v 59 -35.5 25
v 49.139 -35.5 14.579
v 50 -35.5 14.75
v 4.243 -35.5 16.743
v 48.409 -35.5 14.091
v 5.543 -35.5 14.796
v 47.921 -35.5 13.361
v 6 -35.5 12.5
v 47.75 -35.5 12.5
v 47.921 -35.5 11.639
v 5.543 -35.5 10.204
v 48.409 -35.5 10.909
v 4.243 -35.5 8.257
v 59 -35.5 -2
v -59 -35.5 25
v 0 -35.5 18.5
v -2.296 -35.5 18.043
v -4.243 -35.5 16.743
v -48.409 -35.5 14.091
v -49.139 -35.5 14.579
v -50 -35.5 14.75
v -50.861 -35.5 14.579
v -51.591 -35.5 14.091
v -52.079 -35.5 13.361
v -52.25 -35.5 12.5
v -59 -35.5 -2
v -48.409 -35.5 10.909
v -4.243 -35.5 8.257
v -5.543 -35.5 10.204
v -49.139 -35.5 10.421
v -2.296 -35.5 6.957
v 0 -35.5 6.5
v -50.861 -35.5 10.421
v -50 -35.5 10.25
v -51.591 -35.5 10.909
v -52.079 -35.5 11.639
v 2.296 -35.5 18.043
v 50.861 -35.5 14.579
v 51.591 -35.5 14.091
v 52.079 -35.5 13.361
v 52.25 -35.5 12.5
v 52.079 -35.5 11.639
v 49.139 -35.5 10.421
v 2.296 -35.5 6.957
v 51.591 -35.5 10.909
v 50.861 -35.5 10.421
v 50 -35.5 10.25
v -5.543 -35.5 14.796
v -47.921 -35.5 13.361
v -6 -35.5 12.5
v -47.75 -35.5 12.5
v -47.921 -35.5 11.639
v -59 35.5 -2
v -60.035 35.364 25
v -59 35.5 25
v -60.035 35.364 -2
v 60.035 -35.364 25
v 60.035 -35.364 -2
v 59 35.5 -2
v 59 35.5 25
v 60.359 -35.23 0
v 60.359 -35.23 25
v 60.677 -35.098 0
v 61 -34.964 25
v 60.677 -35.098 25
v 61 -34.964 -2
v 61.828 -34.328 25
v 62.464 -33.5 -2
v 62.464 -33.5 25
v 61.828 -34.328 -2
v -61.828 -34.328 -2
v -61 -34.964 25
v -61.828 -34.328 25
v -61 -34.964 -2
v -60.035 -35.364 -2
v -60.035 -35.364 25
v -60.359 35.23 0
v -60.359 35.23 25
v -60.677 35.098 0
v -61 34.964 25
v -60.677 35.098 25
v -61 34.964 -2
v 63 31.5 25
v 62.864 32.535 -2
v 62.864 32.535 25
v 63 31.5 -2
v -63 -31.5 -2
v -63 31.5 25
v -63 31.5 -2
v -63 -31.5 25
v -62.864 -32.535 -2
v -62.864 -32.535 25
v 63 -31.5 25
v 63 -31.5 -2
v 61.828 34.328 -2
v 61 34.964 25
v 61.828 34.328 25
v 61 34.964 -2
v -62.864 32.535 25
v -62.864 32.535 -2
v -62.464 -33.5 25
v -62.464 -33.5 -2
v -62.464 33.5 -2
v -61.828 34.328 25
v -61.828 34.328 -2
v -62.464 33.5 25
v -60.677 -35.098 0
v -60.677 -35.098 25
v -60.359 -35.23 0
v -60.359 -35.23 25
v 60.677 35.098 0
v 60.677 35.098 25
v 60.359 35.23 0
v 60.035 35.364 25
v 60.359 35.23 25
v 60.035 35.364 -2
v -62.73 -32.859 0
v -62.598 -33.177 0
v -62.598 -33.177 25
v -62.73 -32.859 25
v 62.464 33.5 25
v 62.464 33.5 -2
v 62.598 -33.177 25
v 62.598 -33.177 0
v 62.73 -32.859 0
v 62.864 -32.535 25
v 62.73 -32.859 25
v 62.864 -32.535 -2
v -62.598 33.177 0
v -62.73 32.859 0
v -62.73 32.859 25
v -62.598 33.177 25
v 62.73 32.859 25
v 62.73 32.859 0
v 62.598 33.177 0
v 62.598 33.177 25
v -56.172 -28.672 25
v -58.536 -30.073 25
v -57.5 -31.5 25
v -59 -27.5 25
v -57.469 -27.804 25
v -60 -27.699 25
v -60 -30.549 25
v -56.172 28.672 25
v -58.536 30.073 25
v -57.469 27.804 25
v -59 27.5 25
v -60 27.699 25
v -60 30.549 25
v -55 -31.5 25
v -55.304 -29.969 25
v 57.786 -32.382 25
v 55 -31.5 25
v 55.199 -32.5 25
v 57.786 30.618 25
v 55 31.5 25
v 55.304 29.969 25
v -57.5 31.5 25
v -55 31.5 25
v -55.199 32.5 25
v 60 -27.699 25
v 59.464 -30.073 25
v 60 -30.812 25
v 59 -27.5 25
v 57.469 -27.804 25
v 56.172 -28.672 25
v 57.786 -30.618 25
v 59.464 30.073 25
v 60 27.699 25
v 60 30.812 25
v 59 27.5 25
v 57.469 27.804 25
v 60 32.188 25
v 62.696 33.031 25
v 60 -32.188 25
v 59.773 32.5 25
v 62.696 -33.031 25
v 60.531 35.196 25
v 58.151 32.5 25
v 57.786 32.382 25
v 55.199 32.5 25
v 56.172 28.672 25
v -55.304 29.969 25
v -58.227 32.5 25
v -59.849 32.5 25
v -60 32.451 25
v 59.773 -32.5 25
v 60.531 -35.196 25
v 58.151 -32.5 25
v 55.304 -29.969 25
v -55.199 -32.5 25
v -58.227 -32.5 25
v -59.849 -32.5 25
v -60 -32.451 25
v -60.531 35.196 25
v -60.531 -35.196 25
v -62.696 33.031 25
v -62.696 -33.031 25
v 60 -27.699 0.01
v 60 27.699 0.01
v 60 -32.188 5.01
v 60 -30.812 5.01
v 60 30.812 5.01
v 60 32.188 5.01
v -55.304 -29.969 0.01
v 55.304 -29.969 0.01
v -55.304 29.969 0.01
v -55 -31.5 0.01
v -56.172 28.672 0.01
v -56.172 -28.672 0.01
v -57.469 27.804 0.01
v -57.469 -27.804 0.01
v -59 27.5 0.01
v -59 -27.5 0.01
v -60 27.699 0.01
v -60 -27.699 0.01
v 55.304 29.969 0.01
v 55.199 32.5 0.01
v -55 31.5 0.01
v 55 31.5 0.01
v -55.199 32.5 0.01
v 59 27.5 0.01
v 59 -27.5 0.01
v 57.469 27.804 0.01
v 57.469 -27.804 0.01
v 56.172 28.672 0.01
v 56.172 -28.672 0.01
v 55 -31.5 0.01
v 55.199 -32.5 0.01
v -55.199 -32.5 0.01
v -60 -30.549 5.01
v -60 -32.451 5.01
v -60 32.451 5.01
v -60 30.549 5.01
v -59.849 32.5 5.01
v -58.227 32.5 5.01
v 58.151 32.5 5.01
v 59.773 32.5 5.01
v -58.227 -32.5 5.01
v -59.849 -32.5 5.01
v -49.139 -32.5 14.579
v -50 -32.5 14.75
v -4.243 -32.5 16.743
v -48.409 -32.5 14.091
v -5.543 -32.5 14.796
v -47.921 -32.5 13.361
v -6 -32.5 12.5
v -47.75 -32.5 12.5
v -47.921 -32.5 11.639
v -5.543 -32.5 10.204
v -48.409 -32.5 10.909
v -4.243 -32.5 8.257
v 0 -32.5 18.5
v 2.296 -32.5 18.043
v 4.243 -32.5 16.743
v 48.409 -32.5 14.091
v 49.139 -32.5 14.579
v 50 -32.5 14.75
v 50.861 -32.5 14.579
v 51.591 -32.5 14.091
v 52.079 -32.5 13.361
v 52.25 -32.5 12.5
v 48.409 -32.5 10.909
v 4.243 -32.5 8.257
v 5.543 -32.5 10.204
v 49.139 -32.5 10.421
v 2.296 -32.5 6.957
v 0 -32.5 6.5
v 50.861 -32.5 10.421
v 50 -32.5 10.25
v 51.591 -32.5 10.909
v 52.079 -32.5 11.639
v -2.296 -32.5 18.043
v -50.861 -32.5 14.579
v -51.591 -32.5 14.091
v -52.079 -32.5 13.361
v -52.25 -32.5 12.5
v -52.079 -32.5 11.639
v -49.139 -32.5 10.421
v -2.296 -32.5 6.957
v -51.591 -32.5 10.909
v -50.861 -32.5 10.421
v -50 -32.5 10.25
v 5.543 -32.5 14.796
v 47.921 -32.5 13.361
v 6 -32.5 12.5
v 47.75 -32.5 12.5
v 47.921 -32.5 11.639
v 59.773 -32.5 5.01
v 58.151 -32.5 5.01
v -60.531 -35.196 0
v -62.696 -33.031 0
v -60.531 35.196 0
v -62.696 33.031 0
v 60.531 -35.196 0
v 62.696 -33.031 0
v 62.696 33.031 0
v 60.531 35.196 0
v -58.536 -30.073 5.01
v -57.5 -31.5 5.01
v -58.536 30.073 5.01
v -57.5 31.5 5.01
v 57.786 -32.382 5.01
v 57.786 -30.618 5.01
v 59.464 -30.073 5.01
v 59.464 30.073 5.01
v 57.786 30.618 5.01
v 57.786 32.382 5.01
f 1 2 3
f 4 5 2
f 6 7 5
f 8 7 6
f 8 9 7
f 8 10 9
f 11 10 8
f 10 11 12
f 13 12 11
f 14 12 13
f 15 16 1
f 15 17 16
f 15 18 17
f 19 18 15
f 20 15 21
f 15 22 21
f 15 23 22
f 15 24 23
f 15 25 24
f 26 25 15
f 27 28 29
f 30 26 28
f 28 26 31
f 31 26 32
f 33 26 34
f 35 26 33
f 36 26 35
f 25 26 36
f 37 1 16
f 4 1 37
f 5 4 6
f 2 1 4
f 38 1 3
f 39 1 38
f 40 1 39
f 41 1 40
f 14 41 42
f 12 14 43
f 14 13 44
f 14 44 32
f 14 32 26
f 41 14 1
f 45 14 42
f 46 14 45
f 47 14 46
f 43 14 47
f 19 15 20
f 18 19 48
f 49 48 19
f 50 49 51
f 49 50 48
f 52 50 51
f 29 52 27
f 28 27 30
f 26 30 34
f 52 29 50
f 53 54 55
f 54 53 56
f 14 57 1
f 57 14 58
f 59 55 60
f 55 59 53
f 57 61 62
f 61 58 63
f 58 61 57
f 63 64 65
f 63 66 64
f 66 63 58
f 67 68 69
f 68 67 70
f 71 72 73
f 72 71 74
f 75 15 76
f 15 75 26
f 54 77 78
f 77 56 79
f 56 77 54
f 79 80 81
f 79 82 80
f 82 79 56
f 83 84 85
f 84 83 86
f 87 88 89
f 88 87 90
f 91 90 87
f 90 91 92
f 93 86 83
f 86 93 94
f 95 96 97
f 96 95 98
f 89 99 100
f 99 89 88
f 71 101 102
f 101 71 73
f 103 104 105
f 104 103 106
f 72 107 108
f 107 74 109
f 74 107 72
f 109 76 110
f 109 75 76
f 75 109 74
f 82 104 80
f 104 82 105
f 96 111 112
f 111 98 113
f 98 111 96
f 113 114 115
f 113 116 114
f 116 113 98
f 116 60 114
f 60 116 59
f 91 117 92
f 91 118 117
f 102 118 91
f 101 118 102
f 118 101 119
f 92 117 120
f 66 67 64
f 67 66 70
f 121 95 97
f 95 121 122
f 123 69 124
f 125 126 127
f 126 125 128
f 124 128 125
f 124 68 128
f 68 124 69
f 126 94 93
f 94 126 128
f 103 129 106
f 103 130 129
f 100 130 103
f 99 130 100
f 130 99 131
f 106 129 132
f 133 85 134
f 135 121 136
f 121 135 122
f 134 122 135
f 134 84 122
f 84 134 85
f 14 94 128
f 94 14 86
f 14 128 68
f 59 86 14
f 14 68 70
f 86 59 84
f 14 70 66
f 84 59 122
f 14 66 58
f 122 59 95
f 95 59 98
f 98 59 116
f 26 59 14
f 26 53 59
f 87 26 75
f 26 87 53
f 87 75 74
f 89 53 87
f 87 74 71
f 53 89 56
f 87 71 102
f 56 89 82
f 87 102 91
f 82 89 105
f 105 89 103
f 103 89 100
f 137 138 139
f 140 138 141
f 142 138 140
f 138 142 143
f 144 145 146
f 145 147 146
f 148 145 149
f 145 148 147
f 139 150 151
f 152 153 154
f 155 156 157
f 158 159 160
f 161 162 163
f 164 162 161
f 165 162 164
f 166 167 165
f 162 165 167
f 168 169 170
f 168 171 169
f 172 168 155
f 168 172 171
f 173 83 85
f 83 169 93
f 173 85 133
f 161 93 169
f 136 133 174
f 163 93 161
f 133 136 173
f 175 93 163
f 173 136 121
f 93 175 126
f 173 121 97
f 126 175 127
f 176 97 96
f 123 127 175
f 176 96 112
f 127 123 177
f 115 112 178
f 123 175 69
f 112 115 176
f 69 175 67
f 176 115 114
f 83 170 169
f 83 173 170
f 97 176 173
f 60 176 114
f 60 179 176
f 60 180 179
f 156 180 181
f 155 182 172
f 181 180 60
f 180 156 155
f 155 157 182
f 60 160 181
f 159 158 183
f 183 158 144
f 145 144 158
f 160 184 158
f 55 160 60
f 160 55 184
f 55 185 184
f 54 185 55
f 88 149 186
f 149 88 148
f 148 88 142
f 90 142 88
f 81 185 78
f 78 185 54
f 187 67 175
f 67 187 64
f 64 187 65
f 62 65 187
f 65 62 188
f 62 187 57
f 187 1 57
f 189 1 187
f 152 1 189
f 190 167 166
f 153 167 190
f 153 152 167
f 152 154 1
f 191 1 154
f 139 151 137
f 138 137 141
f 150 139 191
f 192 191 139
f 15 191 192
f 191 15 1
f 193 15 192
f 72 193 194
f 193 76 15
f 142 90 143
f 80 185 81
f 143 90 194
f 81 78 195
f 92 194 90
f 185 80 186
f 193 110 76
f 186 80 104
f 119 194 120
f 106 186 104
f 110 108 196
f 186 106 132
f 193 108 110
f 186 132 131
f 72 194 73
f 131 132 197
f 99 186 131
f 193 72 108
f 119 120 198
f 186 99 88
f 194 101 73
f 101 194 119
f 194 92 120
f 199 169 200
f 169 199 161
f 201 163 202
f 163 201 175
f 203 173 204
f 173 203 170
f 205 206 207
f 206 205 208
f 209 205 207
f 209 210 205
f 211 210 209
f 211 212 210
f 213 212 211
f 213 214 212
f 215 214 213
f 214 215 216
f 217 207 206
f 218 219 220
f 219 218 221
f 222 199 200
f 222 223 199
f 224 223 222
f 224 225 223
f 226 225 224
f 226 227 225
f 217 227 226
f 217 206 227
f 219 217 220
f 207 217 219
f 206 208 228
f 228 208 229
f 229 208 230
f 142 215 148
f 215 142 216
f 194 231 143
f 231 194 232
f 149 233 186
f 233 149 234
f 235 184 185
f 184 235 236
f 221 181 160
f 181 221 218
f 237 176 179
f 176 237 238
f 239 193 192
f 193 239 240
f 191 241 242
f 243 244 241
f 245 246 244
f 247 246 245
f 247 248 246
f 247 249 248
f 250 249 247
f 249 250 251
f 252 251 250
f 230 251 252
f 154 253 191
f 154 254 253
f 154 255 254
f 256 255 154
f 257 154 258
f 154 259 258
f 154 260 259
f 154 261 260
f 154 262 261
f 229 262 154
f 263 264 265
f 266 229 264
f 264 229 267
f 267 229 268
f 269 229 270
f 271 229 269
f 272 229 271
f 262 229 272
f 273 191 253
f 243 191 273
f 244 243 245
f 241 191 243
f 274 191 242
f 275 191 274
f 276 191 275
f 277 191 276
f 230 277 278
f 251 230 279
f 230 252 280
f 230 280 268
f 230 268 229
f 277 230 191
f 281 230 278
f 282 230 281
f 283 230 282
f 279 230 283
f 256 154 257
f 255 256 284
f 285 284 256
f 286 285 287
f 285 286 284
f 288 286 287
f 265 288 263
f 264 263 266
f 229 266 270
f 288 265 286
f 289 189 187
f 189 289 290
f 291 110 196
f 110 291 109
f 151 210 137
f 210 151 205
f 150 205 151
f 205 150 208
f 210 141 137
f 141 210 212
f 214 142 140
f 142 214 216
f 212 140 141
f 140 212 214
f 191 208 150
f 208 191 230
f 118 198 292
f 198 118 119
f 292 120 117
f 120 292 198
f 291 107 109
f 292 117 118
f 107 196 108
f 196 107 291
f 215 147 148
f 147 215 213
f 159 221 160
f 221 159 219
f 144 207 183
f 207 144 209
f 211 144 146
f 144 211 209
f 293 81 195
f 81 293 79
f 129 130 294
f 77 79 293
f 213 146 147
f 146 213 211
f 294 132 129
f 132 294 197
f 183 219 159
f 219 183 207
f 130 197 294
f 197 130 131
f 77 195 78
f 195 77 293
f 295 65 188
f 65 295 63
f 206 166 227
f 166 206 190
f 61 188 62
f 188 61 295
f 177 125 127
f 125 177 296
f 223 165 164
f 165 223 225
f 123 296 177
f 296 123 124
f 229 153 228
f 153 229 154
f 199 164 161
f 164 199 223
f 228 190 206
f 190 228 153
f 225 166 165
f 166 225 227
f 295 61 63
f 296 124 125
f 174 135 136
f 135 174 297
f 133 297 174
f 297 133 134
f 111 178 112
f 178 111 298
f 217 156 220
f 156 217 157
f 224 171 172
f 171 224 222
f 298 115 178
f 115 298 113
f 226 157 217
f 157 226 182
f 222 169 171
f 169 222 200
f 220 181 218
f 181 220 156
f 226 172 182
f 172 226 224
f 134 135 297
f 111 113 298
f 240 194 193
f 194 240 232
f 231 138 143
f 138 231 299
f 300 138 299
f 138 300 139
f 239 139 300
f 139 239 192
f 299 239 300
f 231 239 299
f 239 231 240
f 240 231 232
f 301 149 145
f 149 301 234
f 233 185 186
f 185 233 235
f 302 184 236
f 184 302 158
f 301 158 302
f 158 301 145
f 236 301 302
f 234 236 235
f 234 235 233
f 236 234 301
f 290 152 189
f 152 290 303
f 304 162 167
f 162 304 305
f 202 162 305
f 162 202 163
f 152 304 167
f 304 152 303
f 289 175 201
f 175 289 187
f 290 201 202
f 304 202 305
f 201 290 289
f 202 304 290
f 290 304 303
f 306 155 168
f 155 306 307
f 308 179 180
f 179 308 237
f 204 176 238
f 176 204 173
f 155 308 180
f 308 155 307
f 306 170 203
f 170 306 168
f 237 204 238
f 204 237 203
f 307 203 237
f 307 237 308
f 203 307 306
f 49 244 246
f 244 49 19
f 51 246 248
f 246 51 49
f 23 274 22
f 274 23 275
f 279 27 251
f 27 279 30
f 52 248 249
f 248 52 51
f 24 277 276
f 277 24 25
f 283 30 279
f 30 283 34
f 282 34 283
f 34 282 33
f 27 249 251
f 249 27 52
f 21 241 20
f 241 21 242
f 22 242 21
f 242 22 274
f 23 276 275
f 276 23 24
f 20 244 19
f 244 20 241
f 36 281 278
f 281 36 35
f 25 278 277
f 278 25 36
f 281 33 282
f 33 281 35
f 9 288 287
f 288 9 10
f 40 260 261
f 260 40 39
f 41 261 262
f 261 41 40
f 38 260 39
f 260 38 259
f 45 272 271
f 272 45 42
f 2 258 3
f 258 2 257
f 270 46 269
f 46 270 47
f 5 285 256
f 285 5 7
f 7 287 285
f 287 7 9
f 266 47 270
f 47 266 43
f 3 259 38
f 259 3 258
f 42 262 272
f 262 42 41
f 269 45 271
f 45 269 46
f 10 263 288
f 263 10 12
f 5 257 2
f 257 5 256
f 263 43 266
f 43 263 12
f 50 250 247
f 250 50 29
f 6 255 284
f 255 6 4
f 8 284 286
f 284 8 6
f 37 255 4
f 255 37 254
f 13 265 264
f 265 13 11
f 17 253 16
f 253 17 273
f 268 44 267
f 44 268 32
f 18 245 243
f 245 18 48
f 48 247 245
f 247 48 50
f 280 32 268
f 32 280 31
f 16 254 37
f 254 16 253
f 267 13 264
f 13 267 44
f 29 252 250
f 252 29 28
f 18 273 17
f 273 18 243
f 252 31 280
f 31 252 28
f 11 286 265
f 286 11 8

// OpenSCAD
// file: thatbox.scad
module ThatBox_Layout(dims, corner_radius) {
  dx = (dims[0] / 2) - corner_radius;
  dy = (dims[1] / 2) - corner_radius;

  for(x = [-dx, dx]) {
    for(y = [-dy, dy]) {
      translate([x, y]) {
        children();
      }
    }
  }
}

module ThatBox_Plate(dims, thickness, corner_radius) {
  hull() {
    ThatBox_Layout(dims, corner_radius) {
      cylinder(h = thickness, r = corner_radius, $fn = 24);
    }
  }
}

function PlateSize(inner, wall_thickness) = [inner[0] + (wall_thickness * 2), inner[1] + (wall_thickness * 2)];

module ThatBox_Box(
  inner = [120, 80, 30],
  wall_thickness = 2, 
  corner_radius = 4,
  mounting_hole_diameter = 3,
  mounting_hole_depth = 20,
  base_thickness = 3, 
) {
  plate_size = PlateSize(inner, wall_thickness);

  difference() {
    // Outer volume
    translate([0, 0, -base_thickness]) {
      ThatBox_Plate(dims = plate_size, thickness = inner[2] + base_thickness, corner_radius = corner_radius);
    }

    // Inner volume
    translate([0, 0, (inner[2] / 2) + 0.01]) {
      cube(inner, center = true);
    }
  }

  difference() {
    // Mounting hole supports
    ThatBox_Layout(dims = plate_size, corner_radius = corner_radius) {
      cylinder(h = inner[2], r = corner_radius, $fn = 16);
    }

    // Mounting holes
    ThatBox_Layout(dims = plate_size, corner_radius = corner_radius) {
      translate([0, 0, inner[2] - mounting_hole_depth + 0.01]) {
        cylinder(h = mounting_hole_depth, d = mounting_hole_diameter, $fn = 5);
      }
    }
  }
}

module ThatBox_Lid(
  inner = [120, 80, 30],
  wall_thickness = 2, 
  corner_radius = 4,
  mounting_hole_diameter = 3.1,
  lid_thickness = 2,
) {
  plate_size = PlateSize(inner, wall_thickness);

  difference() {
    // Panel
    ThatBox_Plate(dims = plate_size, thickness = lid_thickness, corner_radius = corner_radius);

    // Mounting holes
    ThatBox_Layout(dims = plate_size, corner_radius = corner_radius) {
      translate([0, 0, -1]) {
        cylinder(h = lid_thickness + 2, d = mounting_hole_diameter, $fn = 16);
      }
    }
  }
}

// Demo
color("red") {
  ThatBox_Box();
}
translate([0, 0, 30]) {
  color("blue", 0.5) {
    ThatBox_Lid();
  }
}
// main file
use <thatbox.scad>;

box_inner = [120, 65, 25];
wall_thickness = 3;
base_thickness = 2;

module Box() {
  color("red") {
    difference() {
      ThatBox_Box(
        inner = box_inner,
        wall_thickness = wall_thickness,
        base_thickness = base_thickness
      );

      // Cable hole
      translate([0, -(box_inner[1] / 2) + 0.05, box_inner[2] / 2]) {
        rotate([90, 0, 0]) {
          cylinder(h = wall_thickness + 0.1, d = 12, $fn = 16);
        }
      }

      // Mounting holes
      for(x = [-50, 50]) {
        translate([x, -(box_inner[1] / 2) + 0.05, box_inner[2] / 2]) {
          rotate([90, 0, 0]) {
            cylinder(h = wall_thickness + 0.1, d = 4.5, $fn = 16);
          }
        }
      }
    }
  }
}

module Lid() {
  translate([0, 0, box_inner[2] + 5]) {
    color("blue", 0.5) {
      projection() {
        difference() {
          ThatBox_Lid(inner = box_inner);

          // Reader mounting holes
          for(x = [-30, 30]) {
            for(y = [-25, 25]) {
              translate([x, y, -0.01]) {
                cylinder(h = 3, d = 3.5, $fn = 16);
              }
            }
          }
        }
      }
    }
  }
}

Box();
Lid();
